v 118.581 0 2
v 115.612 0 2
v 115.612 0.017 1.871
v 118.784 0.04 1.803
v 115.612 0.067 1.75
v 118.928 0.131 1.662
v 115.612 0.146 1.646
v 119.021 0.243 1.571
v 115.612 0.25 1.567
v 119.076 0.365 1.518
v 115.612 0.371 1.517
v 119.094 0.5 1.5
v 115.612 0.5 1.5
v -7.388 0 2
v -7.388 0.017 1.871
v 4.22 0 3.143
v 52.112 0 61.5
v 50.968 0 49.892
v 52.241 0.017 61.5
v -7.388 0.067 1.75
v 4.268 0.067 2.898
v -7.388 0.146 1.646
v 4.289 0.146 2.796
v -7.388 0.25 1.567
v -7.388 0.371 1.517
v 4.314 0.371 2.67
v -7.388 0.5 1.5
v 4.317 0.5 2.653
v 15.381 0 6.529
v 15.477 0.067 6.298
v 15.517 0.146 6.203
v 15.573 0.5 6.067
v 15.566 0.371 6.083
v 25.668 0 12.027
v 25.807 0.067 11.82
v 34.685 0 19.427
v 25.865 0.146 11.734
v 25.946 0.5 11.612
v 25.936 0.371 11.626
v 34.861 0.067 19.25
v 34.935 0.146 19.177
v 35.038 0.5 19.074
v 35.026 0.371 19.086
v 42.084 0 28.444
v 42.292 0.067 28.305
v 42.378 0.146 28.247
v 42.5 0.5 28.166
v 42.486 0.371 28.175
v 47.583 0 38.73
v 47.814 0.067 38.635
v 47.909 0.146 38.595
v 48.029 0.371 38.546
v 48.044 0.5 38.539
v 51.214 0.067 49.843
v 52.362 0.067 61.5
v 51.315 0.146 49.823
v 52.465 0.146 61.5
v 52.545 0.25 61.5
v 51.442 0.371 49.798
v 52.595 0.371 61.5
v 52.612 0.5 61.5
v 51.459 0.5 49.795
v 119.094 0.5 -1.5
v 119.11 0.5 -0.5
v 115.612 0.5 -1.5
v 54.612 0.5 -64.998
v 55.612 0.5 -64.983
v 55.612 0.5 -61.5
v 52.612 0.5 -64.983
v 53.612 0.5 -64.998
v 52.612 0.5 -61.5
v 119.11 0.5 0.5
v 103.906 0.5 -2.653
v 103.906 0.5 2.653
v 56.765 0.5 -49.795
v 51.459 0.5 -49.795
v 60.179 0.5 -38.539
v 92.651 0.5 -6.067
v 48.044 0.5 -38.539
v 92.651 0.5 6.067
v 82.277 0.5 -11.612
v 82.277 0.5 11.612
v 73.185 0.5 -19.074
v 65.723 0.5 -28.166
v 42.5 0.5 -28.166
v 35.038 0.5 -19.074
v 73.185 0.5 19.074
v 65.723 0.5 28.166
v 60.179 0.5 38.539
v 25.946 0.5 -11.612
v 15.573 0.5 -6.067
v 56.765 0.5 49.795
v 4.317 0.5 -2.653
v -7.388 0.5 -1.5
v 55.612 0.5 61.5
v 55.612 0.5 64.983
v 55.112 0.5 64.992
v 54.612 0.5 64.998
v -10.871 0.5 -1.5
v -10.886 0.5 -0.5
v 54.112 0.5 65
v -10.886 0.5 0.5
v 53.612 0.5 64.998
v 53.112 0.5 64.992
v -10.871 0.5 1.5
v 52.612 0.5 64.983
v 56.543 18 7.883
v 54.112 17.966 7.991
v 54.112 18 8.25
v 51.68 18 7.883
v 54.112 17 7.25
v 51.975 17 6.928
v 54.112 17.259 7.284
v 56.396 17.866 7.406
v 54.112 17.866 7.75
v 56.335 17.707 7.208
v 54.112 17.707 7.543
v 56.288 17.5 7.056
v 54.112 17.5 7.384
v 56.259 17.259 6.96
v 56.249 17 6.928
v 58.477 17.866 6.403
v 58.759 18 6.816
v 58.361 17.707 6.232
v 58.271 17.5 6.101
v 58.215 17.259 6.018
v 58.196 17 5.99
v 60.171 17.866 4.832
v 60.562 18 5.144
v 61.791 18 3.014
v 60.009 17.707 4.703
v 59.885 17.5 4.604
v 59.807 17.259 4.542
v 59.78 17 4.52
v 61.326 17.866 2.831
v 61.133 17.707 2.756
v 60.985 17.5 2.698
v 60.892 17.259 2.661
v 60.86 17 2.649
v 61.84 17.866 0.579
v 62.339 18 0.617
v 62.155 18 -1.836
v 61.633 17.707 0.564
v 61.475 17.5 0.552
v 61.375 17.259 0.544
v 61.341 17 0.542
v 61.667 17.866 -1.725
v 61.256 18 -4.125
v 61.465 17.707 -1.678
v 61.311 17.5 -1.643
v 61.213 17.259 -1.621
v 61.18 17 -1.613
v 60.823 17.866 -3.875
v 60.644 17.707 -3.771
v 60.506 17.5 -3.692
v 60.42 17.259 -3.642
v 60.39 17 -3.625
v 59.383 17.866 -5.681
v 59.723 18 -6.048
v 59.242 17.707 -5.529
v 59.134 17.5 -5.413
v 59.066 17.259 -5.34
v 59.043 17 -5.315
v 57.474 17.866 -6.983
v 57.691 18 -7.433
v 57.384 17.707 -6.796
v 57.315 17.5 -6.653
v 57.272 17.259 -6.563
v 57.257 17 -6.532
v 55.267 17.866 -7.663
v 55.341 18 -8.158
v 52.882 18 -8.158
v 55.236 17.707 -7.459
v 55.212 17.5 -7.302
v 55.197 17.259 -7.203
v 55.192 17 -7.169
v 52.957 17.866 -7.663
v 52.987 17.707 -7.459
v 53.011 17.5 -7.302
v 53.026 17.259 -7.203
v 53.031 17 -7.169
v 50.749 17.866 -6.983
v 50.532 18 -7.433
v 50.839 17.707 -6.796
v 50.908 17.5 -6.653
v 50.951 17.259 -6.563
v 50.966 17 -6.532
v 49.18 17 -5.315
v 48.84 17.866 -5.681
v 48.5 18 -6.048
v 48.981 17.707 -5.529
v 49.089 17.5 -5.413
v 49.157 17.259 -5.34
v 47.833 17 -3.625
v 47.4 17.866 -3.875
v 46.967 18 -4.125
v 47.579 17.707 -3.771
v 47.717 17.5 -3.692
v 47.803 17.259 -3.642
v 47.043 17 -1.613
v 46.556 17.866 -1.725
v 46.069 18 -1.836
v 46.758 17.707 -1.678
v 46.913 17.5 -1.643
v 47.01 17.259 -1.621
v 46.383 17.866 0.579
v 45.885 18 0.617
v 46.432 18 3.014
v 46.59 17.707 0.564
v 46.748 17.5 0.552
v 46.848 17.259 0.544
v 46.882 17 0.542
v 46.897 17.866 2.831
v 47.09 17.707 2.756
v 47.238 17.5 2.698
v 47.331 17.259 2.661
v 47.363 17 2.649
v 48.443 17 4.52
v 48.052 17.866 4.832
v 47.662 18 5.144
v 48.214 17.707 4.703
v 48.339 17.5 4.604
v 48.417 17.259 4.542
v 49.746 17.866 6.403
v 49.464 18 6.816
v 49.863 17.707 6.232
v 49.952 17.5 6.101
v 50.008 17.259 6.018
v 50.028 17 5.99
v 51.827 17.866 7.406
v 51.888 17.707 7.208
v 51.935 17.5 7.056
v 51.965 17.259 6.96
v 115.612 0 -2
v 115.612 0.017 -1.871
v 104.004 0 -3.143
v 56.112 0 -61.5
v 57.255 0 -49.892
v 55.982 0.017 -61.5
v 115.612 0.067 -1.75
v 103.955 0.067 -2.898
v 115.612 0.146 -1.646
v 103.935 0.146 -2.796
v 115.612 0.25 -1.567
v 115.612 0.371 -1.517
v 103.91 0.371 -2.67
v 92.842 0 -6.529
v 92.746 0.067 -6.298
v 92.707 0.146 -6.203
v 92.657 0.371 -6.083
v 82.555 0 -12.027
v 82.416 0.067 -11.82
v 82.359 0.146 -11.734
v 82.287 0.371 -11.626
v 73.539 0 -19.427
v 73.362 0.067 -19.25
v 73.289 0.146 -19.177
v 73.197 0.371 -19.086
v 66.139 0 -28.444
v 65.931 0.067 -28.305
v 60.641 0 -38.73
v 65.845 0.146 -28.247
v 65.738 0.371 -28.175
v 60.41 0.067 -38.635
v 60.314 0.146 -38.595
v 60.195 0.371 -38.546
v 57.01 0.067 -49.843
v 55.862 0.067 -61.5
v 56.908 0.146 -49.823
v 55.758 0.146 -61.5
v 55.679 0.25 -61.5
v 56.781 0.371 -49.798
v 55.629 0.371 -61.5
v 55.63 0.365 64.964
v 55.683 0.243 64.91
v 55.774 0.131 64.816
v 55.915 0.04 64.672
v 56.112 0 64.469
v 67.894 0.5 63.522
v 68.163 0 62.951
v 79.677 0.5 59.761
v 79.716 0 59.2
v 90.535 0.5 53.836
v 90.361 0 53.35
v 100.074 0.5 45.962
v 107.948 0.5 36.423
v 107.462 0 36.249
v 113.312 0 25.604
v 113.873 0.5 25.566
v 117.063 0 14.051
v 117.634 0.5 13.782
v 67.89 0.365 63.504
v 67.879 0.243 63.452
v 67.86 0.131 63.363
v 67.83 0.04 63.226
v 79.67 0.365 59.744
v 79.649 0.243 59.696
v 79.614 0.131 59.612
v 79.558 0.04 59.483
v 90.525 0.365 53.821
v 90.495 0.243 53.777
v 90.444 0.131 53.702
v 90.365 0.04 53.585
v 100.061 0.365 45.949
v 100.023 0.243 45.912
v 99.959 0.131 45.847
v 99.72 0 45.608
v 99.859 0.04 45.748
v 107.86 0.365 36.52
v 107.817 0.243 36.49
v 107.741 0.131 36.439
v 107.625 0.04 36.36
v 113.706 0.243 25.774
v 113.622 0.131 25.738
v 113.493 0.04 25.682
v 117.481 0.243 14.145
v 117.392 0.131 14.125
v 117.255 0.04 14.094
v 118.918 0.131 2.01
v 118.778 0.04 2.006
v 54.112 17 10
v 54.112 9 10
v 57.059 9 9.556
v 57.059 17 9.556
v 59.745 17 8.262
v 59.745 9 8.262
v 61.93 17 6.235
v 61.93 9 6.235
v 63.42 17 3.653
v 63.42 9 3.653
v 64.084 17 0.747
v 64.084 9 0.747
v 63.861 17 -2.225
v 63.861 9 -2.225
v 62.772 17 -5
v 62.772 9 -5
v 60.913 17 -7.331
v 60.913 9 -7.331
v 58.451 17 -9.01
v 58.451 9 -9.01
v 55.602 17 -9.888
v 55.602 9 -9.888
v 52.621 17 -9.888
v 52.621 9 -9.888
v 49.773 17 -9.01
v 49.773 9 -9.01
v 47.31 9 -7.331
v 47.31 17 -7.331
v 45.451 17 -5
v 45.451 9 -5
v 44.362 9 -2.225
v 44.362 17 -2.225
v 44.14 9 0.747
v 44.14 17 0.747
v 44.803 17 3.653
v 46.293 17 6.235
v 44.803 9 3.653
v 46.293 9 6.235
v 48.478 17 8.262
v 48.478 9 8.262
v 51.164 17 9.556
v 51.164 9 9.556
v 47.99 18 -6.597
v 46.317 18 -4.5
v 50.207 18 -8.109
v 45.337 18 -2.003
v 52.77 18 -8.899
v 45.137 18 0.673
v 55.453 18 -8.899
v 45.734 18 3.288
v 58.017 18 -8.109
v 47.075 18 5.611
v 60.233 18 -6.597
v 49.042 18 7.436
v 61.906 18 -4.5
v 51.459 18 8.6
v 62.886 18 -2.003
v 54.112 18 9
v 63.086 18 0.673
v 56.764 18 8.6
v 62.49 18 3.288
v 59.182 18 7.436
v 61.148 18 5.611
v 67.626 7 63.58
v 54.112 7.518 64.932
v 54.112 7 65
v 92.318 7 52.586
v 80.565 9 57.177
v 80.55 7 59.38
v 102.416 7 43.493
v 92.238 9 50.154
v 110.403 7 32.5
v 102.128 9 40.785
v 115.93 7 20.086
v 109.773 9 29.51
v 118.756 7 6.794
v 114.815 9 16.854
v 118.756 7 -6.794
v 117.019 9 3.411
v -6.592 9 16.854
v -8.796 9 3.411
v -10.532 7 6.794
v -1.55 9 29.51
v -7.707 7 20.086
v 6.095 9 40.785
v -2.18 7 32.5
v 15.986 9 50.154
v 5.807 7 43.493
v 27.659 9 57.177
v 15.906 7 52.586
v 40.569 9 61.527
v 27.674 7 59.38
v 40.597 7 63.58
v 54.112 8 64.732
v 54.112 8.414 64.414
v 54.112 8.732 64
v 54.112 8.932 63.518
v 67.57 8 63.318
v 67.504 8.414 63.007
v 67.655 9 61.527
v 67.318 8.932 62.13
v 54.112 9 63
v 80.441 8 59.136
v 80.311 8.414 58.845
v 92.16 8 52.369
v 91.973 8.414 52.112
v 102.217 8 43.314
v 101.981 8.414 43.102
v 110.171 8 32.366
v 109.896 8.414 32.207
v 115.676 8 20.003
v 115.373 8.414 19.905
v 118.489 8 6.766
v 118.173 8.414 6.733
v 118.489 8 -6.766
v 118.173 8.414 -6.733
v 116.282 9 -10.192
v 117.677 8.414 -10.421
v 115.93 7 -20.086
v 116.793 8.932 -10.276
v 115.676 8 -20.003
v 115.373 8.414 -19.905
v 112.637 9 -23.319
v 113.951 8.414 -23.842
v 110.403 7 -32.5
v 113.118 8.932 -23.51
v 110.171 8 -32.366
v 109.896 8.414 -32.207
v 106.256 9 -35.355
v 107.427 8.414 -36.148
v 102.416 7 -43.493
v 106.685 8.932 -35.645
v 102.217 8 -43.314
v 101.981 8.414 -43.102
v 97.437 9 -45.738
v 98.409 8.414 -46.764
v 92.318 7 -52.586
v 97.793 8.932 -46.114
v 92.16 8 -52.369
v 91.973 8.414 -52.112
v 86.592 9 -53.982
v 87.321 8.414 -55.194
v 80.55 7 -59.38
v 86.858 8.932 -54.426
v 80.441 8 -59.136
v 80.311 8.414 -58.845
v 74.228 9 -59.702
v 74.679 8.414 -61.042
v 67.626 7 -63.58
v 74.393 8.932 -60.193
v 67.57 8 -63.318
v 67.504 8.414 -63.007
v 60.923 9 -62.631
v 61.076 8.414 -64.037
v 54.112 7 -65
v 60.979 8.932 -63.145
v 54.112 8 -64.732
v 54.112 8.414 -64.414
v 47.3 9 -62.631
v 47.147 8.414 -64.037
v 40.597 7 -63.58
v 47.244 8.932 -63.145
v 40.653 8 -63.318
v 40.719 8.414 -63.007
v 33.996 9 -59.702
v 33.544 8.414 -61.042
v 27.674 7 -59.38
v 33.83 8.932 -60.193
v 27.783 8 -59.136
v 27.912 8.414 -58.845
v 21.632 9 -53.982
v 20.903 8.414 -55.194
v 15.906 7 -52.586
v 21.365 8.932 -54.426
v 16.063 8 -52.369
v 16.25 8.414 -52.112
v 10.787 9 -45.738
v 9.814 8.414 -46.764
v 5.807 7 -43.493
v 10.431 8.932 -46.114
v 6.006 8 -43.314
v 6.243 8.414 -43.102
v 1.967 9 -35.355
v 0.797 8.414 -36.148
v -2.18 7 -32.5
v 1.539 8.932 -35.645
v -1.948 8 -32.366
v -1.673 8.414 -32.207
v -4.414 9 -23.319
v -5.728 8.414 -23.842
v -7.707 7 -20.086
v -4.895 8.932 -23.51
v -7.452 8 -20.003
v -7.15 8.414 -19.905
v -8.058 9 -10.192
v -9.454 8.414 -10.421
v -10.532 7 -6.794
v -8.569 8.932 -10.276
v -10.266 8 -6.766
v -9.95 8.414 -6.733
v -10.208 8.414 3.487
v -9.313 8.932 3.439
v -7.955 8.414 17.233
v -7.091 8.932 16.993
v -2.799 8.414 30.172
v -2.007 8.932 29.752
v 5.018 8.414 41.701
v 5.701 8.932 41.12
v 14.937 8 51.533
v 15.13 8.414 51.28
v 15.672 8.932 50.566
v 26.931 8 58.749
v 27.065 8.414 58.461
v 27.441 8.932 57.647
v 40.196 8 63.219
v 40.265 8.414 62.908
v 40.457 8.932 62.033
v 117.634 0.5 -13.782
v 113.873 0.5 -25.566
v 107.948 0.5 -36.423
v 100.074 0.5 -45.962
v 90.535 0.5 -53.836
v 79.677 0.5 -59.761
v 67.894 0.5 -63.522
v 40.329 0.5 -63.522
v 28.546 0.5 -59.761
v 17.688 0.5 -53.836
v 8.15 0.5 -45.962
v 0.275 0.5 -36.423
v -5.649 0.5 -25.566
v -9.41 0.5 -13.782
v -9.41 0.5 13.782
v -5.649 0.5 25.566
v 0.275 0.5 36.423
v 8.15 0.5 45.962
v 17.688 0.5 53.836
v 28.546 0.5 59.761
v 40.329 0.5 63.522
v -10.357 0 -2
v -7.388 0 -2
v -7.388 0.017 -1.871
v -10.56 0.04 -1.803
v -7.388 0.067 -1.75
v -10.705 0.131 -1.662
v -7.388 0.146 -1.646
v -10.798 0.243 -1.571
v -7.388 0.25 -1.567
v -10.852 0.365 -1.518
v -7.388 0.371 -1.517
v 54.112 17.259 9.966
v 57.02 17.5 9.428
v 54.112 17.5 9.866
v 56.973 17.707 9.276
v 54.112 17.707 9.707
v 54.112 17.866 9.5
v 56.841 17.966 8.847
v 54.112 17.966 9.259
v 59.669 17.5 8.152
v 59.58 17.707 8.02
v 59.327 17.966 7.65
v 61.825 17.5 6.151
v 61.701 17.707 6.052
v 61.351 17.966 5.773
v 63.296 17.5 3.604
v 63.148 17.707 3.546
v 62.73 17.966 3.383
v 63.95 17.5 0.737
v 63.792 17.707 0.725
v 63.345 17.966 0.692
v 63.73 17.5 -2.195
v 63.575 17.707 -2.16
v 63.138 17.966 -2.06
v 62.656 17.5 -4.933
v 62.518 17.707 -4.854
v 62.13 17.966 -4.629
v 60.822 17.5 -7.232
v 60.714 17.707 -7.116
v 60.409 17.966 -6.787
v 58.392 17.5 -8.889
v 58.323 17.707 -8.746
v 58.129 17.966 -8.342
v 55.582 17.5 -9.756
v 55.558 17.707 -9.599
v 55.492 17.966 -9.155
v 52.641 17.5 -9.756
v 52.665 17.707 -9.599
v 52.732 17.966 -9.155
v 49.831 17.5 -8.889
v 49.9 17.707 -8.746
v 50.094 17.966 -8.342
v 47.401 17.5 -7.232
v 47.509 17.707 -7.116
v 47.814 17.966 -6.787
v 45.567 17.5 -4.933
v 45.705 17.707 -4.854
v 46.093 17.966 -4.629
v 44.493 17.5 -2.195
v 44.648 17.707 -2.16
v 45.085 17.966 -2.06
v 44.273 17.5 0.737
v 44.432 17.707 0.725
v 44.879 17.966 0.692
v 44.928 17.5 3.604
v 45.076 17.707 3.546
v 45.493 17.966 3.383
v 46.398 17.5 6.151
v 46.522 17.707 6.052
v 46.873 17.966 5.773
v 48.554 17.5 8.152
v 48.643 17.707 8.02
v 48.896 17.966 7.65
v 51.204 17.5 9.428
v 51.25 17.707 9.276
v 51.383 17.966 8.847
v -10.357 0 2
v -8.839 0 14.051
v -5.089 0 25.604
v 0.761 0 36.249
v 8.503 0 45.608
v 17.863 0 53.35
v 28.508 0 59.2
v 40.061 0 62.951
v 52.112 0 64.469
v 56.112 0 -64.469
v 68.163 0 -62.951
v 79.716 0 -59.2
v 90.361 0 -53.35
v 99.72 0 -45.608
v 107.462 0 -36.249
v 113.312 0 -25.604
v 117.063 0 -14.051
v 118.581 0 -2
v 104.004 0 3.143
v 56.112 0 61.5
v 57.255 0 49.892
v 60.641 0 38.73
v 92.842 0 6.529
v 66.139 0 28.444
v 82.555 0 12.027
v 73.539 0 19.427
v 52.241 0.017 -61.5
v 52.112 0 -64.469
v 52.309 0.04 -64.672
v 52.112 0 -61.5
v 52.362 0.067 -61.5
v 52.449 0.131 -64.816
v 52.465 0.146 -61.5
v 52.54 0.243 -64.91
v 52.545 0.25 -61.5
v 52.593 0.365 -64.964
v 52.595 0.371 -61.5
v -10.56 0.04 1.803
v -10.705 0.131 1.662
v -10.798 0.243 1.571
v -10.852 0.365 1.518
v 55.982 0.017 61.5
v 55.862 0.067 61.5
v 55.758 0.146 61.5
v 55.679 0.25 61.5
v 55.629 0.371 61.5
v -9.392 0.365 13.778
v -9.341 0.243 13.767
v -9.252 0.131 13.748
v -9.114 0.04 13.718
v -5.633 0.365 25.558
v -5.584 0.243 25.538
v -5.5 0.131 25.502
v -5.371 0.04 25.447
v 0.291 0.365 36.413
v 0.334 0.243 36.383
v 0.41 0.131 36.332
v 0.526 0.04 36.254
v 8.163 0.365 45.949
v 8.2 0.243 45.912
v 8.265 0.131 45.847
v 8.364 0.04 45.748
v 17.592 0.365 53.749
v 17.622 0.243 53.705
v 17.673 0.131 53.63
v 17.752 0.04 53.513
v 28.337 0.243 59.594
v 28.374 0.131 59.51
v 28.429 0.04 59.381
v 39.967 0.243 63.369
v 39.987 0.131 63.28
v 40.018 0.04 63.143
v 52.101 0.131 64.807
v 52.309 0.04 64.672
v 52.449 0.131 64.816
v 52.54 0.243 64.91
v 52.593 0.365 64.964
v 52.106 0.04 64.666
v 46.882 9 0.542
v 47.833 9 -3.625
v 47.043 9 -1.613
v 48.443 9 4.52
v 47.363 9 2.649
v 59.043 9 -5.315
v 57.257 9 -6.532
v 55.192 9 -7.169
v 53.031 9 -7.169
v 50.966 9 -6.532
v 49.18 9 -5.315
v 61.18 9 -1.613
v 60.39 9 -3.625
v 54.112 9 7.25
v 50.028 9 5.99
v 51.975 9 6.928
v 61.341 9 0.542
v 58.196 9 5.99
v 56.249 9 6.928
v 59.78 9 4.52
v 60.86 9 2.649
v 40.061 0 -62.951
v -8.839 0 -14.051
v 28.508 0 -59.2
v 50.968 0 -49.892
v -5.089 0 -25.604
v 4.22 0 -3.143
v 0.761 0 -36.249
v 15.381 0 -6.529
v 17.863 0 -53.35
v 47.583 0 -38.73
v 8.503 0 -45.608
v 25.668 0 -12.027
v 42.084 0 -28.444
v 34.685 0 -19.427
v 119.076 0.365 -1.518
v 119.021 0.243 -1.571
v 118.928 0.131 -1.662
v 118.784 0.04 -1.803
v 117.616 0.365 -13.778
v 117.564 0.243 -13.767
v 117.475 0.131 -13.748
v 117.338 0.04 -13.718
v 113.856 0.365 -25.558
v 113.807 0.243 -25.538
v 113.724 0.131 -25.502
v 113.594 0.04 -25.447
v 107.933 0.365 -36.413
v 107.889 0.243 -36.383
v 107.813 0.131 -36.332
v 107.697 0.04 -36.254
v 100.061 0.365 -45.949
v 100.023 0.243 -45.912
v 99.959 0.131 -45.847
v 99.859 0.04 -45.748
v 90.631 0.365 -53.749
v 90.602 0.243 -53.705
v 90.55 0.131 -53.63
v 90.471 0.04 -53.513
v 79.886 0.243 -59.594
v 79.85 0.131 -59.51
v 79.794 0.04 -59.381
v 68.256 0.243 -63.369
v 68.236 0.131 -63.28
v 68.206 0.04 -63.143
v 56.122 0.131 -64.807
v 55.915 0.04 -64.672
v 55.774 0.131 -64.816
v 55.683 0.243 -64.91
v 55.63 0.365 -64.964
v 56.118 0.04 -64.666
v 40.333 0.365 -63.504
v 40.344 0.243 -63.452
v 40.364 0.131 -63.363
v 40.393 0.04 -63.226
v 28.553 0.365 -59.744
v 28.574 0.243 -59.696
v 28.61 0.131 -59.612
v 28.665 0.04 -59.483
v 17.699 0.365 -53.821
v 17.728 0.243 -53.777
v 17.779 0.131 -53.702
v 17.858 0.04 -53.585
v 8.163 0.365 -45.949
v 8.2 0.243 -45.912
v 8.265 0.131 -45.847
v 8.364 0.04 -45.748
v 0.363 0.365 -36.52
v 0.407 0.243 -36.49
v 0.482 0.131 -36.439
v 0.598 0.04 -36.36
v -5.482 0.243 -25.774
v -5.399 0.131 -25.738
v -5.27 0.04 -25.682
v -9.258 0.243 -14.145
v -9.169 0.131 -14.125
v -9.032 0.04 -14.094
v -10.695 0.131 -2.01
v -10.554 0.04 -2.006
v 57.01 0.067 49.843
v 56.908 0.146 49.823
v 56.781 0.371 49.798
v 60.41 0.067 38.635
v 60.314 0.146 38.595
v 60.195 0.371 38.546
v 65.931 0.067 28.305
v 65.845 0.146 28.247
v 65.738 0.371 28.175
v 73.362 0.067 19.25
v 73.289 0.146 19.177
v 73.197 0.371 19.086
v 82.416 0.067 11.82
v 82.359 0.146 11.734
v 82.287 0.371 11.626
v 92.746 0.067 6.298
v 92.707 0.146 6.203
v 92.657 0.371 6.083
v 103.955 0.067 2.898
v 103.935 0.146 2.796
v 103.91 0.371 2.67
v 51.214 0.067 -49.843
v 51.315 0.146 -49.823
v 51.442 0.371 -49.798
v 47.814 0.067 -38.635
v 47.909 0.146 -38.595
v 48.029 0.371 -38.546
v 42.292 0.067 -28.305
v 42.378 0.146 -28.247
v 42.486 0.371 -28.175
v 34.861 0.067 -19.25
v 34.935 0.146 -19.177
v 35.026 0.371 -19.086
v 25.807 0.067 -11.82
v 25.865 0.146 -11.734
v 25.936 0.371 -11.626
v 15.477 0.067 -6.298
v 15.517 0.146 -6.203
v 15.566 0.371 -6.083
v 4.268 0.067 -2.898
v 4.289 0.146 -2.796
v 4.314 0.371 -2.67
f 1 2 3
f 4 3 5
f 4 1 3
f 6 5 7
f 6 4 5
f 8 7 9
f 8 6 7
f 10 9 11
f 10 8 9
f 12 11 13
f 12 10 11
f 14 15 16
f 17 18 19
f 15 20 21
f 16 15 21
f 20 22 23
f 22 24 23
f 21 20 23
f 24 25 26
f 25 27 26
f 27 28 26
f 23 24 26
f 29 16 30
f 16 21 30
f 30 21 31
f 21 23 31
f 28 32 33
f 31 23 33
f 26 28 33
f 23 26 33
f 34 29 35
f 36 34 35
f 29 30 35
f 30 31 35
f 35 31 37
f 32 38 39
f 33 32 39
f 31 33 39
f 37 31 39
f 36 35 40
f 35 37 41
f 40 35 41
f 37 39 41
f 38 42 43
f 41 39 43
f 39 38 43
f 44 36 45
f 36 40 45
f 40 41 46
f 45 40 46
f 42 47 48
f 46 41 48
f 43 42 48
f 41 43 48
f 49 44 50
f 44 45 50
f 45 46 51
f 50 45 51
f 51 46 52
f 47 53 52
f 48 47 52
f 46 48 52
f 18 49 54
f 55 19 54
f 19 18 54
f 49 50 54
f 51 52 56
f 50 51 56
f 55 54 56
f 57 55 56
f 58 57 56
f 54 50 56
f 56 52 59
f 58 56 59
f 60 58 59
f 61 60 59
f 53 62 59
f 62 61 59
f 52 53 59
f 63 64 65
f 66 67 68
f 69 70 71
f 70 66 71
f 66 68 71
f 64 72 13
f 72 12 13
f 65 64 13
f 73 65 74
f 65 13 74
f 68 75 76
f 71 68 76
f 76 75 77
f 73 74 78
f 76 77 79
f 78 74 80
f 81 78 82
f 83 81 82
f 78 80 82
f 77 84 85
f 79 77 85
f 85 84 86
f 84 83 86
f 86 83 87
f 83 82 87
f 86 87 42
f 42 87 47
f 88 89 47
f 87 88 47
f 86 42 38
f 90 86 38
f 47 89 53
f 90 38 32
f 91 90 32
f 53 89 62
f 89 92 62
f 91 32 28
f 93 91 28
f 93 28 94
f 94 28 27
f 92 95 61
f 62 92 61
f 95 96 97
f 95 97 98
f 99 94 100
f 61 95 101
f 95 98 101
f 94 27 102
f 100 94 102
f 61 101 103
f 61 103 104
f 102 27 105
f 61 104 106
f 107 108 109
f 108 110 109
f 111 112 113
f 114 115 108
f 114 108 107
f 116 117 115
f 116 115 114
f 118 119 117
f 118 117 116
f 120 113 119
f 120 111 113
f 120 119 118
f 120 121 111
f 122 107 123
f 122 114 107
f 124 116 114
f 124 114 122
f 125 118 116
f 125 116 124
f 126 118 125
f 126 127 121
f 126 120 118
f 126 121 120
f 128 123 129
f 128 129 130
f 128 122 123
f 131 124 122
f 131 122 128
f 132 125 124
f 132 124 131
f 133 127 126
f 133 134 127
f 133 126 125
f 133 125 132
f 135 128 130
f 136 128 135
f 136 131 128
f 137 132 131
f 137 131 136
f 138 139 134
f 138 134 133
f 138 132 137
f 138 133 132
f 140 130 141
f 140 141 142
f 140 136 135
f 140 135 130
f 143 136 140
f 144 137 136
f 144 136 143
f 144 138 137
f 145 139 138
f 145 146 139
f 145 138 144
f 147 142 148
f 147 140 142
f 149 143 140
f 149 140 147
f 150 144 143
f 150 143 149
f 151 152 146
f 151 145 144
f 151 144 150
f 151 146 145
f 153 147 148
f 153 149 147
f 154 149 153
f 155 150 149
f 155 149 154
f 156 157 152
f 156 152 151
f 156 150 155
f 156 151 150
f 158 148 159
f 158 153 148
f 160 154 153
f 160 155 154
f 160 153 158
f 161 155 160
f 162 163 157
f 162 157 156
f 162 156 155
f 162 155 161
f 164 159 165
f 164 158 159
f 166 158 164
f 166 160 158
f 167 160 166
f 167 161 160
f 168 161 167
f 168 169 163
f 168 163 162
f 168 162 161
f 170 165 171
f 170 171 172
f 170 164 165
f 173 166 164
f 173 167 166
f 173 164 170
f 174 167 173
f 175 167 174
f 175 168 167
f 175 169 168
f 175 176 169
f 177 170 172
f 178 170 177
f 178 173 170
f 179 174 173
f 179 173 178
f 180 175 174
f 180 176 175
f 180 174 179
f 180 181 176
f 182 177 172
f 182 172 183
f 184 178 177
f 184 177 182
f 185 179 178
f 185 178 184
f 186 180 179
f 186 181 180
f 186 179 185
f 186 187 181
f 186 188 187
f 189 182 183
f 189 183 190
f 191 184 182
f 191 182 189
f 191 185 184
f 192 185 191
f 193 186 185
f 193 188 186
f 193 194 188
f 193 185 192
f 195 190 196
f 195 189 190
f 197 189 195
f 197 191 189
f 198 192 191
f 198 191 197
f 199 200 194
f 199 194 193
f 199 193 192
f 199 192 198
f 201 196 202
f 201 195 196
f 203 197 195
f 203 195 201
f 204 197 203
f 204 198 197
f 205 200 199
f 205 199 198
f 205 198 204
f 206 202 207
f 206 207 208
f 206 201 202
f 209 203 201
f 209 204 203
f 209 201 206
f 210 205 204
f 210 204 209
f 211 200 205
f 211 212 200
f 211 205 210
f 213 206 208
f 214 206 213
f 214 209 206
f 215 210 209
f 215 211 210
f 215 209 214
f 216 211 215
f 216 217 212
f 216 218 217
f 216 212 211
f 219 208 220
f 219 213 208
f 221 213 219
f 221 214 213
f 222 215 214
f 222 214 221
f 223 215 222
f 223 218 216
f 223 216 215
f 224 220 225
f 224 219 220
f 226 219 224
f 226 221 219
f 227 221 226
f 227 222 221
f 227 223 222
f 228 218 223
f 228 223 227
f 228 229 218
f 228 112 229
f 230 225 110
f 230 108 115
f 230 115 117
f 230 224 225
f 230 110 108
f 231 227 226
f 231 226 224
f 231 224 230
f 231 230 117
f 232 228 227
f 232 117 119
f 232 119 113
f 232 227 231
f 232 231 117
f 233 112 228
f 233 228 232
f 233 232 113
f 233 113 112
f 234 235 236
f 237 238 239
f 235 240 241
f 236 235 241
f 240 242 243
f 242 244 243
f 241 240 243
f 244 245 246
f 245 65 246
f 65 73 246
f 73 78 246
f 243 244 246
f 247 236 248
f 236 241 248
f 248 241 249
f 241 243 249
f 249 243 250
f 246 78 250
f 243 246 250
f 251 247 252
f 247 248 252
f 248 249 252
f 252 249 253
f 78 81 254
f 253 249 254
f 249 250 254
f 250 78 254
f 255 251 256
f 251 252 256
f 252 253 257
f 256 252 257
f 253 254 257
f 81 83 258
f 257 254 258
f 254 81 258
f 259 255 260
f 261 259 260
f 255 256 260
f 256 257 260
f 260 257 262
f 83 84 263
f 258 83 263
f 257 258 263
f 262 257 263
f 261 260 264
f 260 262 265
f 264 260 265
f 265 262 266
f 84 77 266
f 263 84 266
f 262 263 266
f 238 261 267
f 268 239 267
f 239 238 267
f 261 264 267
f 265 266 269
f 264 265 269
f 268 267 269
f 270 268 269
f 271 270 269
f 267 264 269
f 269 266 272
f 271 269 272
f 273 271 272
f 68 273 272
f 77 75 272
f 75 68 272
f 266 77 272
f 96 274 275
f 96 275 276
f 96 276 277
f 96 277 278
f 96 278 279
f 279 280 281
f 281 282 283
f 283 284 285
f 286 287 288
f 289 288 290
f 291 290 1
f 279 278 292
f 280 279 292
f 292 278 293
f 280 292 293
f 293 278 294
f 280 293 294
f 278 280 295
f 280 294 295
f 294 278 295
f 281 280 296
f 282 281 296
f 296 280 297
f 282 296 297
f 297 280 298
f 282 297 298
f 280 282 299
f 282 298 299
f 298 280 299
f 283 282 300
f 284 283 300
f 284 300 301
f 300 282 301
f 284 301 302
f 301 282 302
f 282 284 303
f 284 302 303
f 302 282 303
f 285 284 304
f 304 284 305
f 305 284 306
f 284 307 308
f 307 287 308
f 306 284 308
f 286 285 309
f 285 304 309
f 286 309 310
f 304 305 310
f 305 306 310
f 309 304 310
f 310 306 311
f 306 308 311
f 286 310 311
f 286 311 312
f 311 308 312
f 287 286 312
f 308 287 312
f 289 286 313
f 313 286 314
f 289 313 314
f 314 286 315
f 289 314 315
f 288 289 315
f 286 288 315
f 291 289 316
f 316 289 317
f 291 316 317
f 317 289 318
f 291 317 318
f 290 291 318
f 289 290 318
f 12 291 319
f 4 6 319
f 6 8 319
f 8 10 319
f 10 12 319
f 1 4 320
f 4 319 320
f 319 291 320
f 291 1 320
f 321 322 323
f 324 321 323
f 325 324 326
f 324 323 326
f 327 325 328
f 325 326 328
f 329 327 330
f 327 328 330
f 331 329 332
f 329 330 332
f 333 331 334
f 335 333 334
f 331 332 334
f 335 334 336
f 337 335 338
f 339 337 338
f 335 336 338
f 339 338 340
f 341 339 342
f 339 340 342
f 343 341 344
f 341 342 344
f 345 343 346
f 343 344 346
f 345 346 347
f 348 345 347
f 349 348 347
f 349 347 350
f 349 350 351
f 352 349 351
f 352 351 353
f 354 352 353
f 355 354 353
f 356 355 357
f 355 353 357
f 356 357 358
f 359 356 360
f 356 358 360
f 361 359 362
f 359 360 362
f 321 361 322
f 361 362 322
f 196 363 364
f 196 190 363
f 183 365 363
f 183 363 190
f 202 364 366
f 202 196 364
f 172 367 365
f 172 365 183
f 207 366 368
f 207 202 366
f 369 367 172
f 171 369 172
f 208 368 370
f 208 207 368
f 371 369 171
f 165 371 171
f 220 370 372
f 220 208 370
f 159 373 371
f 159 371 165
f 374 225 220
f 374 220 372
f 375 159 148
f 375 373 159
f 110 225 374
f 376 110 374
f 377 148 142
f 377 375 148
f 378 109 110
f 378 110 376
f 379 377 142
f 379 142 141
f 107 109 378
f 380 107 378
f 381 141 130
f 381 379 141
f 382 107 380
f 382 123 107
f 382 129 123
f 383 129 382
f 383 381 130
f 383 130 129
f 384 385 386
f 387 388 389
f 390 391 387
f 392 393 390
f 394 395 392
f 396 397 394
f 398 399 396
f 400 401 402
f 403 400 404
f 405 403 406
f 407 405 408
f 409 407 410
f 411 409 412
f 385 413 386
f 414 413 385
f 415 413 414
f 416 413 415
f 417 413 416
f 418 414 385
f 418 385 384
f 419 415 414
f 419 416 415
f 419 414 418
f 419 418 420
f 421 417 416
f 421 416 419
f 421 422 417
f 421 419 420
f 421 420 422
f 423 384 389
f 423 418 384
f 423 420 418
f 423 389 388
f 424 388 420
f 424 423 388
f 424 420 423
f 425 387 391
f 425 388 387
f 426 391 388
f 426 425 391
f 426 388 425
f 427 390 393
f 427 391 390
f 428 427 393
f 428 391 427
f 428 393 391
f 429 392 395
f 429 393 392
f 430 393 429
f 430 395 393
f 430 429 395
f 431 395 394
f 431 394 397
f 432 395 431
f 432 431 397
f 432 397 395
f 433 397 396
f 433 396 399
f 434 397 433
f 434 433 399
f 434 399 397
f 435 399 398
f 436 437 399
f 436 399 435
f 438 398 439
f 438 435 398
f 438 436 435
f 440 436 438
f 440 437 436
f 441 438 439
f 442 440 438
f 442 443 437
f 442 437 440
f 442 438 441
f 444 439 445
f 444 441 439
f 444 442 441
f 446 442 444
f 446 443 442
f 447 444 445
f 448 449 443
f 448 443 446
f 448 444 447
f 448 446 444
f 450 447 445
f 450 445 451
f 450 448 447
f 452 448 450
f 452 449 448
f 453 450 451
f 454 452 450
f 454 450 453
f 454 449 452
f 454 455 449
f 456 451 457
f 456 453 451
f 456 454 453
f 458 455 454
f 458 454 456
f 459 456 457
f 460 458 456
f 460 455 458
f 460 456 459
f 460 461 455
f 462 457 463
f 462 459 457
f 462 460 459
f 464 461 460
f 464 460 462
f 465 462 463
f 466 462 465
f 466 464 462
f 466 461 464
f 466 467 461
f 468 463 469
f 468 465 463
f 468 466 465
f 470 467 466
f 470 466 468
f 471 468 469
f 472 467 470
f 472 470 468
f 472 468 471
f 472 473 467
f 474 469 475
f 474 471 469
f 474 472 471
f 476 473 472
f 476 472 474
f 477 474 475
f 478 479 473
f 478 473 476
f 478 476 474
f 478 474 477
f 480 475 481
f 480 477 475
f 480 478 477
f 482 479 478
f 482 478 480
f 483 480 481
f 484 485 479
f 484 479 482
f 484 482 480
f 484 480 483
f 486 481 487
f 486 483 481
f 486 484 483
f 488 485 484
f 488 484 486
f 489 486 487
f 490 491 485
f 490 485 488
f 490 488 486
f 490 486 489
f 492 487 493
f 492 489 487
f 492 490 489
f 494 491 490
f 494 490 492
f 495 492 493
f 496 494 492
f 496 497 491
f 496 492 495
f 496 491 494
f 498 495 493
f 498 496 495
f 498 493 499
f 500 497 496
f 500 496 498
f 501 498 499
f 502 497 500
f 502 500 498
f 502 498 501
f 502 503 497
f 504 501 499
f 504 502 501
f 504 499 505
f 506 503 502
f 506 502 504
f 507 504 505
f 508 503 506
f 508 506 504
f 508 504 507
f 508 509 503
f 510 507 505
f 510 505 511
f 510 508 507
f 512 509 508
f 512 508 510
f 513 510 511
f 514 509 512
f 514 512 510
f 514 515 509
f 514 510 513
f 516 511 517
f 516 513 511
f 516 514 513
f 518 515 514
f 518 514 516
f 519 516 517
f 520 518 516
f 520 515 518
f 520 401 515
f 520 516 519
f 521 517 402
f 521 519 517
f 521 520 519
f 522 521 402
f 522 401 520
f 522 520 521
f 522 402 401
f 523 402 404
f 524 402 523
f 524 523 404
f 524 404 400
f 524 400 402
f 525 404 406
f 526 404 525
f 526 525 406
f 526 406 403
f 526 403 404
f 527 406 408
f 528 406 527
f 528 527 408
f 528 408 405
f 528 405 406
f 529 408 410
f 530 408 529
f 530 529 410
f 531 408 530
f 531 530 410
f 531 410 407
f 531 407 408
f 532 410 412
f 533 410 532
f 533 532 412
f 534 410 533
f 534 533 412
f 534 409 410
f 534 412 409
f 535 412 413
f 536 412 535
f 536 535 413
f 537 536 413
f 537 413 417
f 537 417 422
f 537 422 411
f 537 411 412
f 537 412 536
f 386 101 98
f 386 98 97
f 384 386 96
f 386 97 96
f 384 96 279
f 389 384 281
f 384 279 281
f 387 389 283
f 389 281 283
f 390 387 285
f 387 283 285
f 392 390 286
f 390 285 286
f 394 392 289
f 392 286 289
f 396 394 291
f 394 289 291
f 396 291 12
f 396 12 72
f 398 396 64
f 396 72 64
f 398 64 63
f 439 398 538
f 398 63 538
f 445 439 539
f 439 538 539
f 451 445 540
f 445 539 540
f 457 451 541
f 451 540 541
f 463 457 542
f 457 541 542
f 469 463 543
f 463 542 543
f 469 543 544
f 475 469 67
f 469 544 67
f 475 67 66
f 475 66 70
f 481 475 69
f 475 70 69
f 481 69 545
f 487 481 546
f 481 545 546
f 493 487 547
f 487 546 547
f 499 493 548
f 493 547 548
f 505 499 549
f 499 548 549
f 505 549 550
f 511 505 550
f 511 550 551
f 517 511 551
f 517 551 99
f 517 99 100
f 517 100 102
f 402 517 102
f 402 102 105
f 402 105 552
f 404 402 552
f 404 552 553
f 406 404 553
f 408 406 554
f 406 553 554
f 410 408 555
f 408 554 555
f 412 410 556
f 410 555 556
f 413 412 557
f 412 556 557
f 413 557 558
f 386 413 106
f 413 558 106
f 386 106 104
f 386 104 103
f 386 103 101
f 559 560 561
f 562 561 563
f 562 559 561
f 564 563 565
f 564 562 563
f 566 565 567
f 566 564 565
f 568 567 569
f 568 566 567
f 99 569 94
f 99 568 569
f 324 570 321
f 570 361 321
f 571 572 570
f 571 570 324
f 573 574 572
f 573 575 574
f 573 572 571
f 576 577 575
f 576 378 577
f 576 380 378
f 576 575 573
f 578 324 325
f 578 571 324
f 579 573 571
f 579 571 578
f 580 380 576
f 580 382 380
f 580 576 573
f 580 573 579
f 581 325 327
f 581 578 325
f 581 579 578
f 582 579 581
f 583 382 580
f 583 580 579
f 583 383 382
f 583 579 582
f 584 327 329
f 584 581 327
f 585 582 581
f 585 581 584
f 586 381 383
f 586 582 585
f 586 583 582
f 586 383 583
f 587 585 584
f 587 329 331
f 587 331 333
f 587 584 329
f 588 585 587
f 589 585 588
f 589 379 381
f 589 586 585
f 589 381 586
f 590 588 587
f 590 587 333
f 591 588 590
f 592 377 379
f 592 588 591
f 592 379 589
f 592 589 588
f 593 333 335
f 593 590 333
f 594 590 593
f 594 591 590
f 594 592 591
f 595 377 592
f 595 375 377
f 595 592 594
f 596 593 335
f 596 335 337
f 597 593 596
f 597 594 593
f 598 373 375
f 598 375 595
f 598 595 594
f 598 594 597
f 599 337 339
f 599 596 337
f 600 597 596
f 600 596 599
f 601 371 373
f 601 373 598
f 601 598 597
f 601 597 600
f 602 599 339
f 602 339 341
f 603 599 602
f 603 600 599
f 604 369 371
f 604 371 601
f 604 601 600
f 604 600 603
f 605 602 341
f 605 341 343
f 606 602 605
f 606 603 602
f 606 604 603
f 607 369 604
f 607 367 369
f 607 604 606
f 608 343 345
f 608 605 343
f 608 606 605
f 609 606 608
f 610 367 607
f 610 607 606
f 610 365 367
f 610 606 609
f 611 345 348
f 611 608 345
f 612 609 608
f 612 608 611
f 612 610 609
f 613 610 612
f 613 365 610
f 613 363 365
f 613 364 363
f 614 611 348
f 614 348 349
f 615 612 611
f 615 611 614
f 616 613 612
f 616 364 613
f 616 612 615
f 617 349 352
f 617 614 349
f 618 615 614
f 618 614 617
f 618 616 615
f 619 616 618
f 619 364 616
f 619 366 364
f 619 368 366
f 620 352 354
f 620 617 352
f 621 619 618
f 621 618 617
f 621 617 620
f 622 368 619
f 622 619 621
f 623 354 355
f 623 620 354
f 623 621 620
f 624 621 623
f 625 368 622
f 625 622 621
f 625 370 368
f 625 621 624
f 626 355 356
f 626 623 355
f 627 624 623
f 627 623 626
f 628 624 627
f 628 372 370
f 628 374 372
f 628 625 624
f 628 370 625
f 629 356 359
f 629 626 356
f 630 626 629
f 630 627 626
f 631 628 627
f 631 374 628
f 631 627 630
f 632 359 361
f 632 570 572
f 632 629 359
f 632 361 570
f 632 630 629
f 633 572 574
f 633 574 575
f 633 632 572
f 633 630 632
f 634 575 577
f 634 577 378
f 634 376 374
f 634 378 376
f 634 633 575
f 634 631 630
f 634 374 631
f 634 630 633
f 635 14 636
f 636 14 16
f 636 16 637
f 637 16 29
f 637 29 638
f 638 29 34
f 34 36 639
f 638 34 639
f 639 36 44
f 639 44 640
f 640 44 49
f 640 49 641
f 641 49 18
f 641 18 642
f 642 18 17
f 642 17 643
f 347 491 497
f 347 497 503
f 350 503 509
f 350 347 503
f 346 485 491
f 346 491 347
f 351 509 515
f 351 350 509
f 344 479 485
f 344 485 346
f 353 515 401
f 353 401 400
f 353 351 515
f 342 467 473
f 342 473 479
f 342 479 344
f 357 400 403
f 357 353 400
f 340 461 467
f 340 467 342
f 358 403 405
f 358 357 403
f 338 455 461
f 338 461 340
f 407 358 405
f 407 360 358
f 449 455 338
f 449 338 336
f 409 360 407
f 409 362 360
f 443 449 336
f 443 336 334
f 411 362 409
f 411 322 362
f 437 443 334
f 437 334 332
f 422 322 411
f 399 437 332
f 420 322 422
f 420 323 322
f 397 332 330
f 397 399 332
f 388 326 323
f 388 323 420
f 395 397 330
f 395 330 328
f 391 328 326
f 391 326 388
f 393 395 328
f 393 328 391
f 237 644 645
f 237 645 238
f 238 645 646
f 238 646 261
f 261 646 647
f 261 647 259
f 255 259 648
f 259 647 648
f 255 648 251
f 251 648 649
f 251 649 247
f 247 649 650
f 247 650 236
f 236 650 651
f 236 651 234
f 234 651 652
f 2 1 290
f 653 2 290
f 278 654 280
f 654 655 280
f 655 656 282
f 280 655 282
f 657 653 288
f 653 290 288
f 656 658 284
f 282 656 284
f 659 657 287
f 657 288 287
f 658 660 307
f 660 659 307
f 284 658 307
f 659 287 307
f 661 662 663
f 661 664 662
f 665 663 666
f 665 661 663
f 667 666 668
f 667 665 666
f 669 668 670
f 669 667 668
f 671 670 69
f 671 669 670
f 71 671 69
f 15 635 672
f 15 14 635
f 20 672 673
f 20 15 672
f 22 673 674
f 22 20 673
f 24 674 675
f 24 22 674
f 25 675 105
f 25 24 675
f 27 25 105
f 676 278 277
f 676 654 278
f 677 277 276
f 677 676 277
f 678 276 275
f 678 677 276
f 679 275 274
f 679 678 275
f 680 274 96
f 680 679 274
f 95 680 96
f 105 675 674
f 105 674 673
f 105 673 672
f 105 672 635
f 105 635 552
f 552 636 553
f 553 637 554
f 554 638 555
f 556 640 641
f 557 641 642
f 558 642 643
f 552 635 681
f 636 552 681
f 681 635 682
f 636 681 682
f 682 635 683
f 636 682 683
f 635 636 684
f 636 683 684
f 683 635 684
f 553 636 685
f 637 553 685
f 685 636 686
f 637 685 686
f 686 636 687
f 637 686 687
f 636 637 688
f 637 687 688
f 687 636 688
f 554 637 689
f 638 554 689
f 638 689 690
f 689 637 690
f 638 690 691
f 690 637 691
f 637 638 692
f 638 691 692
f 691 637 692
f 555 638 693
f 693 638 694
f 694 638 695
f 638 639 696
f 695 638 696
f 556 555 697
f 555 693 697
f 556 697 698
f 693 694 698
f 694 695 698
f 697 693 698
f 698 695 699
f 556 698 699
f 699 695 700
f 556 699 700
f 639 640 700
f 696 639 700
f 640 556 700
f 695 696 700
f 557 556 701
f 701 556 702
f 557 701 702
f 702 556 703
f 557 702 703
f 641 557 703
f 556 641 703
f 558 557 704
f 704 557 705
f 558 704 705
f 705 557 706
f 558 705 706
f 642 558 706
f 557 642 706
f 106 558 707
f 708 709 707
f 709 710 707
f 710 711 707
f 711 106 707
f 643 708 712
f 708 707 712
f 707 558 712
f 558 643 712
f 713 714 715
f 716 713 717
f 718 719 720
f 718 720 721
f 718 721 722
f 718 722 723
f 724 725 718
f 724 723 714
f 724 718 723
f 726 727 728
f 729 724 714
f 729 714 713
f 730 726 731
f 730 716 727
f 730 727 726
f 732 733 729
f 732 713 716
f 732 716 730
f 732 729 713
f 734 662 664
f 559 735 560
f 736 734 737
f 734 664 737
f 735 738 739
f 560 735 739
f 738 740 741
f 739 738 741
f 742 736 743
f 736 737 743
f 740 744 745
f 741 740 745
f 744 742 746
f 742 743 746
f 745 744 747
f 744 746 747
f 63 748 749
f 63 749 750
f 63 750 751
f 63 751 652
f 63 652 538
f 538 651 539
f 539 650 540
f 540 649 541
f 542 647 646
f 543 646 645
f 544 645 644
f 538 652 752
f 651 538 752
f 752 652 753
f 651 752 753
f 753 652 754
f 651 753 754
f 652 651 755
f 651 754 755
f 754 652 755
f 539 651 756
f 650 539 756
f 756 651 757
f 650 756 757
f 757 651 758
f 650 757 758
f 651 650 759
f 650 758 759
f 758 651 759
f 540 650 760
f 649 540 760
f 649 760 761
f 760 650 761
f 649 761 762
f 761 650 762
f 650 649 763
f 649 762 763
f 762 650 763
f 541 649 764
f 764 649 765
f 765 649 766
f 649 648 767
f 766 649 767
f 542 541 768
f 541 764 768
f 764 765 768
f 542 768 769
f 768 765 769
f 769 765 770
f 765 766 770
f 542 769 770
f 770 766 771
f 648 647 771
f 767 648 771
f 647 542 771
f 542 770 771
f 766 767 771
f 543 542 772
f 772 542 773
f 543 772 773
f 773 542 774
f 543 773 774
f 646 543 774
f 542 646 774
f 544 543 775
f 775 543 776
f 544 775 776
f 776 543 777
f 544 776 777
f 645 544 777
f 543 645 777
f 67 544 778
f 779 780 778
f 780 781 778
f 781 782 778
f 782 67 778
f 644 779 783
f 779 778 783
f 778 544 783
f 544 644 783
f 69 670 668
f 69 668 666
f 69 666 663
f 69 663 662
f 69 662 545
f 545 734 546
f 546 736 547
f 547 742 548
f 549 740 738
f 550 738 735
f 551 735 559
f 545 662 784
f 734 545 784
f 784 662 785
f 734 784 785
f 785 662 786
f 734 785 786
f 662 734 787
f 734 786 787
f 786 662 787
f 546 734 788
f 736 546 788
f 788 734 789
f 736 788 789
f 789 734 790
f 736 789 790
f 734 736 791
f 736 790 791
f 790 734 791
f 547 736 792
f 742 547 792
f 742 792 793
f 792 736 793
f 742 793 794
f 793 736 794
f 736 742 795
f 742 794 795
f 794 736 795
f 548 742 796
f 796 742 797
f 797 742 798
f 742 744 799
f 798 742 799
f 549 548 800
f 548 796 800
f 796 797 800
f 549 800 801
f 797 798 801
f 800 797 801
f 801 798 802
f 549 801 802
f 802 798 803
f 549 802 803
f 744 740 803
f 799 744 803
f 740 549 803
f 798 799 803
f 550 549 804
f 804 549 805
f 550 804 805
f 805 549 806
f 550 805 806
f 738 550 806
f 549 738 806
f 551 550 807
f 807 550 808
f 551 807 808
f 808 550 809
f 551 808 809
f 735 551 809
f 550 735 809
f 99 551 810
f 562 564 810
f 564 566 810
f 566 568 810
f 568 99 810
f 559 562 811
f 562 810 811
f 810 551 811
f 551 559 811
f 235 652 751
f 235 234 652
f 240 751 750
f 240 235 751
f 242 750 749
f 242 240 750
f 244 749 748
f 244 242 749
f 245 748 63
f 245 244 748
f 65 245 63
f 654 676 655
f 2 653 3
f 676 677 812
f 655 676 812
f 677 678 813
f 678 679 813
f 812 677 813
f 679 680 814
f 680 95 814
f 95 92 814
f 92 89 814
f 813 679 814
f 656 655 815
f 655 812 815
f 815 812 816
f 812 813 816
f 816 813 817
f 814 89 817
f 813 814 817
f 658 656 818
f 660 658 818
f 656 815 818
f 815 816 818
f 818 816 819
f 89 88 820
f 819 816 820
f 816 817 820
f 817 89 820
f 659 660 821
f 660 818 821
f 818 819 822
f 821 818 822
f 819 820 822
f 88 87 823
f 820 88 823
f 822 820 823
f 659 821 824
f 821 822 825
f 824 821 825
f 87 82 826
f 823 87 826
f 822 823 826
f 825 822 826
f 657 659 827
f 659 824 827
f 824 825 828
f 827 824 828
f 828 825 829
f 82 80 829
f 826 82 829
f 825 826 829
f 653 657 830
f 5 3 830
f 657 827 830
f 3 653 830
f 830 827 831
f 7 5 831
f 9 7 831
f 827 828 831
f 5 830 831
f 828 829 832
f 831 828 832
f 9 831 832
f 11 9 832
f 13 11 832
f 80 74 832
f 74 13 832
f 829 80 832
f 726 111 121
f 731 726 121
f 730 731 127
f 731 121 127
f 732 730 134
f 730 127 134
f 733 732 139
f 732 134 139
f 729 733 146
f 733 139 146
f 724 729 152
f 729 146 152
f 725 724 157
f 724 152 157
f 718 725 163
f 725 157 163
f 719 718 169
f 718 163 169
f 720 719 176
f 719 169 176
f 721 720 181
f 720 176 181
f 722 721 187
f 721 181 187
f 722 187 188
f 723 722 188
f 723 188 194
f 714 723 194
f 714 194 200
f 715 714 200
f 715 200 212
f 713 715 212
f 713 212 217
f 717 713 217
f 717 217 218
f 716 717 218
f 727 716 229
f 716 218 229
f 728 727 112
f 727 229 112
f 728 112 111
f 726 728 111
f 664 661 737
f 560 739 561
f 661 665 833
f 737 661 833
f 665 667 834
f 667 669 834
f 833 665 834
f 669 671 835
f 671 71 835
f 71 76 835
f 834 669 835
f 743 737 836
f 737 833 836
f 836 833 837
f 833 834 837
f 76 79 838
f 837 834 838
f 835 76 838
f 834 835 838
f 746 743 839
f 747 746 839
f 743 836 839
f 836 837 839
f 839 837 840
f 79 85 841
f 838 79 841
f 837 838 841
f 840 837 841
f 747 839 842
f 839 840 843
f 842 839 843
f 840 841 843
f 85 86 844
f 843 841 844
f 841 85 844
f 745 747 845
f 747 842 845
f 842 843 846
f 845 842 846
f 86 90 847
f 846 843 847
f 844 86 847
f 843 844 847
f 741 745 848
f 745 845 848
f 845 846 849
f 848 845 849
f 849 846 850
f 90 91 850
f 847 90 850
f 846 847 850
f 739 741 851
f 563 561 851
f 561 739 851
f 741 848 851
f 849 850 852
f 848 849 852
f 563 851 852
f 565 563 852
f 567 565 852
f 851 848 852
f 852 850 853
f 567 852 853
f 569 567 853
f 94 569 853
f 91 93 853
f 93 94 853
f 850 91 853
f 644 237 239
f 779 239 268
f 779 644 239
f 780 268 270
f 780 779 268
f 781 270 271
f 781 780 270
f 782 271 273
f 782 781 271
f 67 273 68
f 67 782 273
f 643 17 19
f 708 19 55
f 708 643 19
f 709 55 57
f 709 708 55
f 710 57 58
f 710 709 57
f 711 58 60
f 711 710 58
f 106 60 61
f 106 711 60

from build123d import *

# Parameters (mm, degrees)
SKETCH1_R           = 65
BOSS_EXTRUDE1_DEPTH = 9
SKETCH2_R           = 10
BOSS_EXTRUDE2_DEPTH = 9
SKETCH3_R           = 7.25
CUT_EXTRUDE1_DEPTH  = 9
CUT_EXTRUDE2_DEPTH  = 0.5
FILLET1_R           = 0.5
FILLET2_R           = 2
FILLET3_R           = 1


with BuildPart() as part:
    # Sketch1 → Boss-Extrude1 (new body)
    with BuildSketch(Plane(origin=(0, 0, 0), x_dir=(1, 0, 0), z_dir=(0, 1, 0))):
        with Locations(Location((54.111665284, 0, 0), (0, 0, 270))):
            Circle(SKETCH1_R)
    extrude(amount=BOSS_EXTRUDE1_DEPTH)

    # Sketch2 → Boss-Extrude2 (add)
    with BuildSketch(Plane(origin=(0, 9, 0), x_dir=(1, 0, 0), z_dir=(0, 1, 0))):
        with Locations(Location((54.111665284, 0, 0), (0, 0, 270))):
            Circle(SKETCH2_R)
    extrude(amount=BOSS_EXTRUDE2_DEPTH)

    # Sketch3 → Cut-Extrude1 (cut)
    with BuildSketch(Plane(origin=(0, 18, 0), x_dir=(1, 0, 0), z_dir=(0, 1, 0))):
        with Locations(Location((54.111665284, 0, 0), (0, 0, 270))):
            Circle(SKETCH3_R)
    extrude(amount=-CUT_EXTRUDE1_DEPTH, mode=Mode.SUBTRACT)

    # Sketch4 → Cut-Extrude2 (cut)
    with BuildSketch(Plane.XZ):
        with BuildLine():
            Line((-21.399913382, 1.5), (-7.388334716, 1.5))
            ThreePointArc((-7.388334716, 1.5), (35.038072155, 19.073593129), (52.611665284, 61.5))
            Line((52.611665284, 61.5), (52.611665284, 70.134963097))
            Line((52.611665284, 70.134963097), (55.611665284, 70.134963097))
            Line((55.611665284, 70.134963097), (55.611665284, 61.5))
            ThreePointArc((55.611665284, 61.5), (73.185258413, 19.073593129), (115.611665284, 1.5))
            Line((115.611665284, 1.5), (129.62324395, 1.5))
            Line((129.62324395, 1.5), (129.62324395, -1.5))
            Line((129.62324395, -1.5), (115.611665284, -1.5))
            ThreePointArc((115.611665284, -1.5), (73.185258413, -19.073593129), (55.611665284, -61.5))
            Line((55.611665284, -61.5), (55.611665284, -70.134963097))
            Line((55.611665284, -70.134963097), (52.611665284, -70.134963097))
            Line((52.611665284, -70.134963097), (52.611665284, -61.5))
            ThreePointArc((52.611665284, -61.5), (35.038072155, -19.073593129), (-7.388334716, -1.5))
            Line((-7.388334716, -1.5), (-21.399913382, -1.5))
            Line((-21.399913382, -1.5), (-21.399913382, 1.5))
        make_face()
    extrude(amount=-CUT_EXTRUDE2_DEPTH, mode=Mode.SUBTRACT)

    # Fillet1
    fillet1_edges = [part.edges().sort_by_distance(p)[0] for p in [
        (117.353010285, 0, 1.5),
        (55.611665284, 0, 63.241345001),
        (100.073606061, 0, 45.961940777),
        (52.611665284, 0, 63.241345001),
        (-9.129679717, 0, 1.5),
        (8.149724507, 0, 45.961940777),
        (-9.129679717, 0, -1.5),
        (52.611665284, 0, -63.241345001),
        (8.149724507, 0, -45.961940777),
        (55.611665284, 0, -63.241345001),
        (117.353010285, 0, -1.5),
        (100.073606061, 0, -45.961940777),
        (73.185258413, 0, 19.073593129),
        (73.185258413, 0, -19.073593129),
        (35.038072155, 0, -19.073593129),
        (35.038072155, 0, 19.073593129),
    ]]
    fillet(fillet1_edges, radius=FILLET1_R - 0.0001)  # a hair under: the kernel refuses the full size

    # Fillet2
    fillet2_edges = [part.edges().sort_by_distance(p)[0] for p in [
        (54.111665284, 9, -65),
    ]]
    fillet(fillet2_edges, radius=FILLET2_R)

    # Fillet3
    fillet3_edges = [part.edges().sort_by_distance(p)[0] for p in [
        (54.111665284, 18, -7.25),
        (54.111665284, 18, -10),
    ]]
    fillet(fillet3_edges, radius=FILLET3_R)


solid = part.part
